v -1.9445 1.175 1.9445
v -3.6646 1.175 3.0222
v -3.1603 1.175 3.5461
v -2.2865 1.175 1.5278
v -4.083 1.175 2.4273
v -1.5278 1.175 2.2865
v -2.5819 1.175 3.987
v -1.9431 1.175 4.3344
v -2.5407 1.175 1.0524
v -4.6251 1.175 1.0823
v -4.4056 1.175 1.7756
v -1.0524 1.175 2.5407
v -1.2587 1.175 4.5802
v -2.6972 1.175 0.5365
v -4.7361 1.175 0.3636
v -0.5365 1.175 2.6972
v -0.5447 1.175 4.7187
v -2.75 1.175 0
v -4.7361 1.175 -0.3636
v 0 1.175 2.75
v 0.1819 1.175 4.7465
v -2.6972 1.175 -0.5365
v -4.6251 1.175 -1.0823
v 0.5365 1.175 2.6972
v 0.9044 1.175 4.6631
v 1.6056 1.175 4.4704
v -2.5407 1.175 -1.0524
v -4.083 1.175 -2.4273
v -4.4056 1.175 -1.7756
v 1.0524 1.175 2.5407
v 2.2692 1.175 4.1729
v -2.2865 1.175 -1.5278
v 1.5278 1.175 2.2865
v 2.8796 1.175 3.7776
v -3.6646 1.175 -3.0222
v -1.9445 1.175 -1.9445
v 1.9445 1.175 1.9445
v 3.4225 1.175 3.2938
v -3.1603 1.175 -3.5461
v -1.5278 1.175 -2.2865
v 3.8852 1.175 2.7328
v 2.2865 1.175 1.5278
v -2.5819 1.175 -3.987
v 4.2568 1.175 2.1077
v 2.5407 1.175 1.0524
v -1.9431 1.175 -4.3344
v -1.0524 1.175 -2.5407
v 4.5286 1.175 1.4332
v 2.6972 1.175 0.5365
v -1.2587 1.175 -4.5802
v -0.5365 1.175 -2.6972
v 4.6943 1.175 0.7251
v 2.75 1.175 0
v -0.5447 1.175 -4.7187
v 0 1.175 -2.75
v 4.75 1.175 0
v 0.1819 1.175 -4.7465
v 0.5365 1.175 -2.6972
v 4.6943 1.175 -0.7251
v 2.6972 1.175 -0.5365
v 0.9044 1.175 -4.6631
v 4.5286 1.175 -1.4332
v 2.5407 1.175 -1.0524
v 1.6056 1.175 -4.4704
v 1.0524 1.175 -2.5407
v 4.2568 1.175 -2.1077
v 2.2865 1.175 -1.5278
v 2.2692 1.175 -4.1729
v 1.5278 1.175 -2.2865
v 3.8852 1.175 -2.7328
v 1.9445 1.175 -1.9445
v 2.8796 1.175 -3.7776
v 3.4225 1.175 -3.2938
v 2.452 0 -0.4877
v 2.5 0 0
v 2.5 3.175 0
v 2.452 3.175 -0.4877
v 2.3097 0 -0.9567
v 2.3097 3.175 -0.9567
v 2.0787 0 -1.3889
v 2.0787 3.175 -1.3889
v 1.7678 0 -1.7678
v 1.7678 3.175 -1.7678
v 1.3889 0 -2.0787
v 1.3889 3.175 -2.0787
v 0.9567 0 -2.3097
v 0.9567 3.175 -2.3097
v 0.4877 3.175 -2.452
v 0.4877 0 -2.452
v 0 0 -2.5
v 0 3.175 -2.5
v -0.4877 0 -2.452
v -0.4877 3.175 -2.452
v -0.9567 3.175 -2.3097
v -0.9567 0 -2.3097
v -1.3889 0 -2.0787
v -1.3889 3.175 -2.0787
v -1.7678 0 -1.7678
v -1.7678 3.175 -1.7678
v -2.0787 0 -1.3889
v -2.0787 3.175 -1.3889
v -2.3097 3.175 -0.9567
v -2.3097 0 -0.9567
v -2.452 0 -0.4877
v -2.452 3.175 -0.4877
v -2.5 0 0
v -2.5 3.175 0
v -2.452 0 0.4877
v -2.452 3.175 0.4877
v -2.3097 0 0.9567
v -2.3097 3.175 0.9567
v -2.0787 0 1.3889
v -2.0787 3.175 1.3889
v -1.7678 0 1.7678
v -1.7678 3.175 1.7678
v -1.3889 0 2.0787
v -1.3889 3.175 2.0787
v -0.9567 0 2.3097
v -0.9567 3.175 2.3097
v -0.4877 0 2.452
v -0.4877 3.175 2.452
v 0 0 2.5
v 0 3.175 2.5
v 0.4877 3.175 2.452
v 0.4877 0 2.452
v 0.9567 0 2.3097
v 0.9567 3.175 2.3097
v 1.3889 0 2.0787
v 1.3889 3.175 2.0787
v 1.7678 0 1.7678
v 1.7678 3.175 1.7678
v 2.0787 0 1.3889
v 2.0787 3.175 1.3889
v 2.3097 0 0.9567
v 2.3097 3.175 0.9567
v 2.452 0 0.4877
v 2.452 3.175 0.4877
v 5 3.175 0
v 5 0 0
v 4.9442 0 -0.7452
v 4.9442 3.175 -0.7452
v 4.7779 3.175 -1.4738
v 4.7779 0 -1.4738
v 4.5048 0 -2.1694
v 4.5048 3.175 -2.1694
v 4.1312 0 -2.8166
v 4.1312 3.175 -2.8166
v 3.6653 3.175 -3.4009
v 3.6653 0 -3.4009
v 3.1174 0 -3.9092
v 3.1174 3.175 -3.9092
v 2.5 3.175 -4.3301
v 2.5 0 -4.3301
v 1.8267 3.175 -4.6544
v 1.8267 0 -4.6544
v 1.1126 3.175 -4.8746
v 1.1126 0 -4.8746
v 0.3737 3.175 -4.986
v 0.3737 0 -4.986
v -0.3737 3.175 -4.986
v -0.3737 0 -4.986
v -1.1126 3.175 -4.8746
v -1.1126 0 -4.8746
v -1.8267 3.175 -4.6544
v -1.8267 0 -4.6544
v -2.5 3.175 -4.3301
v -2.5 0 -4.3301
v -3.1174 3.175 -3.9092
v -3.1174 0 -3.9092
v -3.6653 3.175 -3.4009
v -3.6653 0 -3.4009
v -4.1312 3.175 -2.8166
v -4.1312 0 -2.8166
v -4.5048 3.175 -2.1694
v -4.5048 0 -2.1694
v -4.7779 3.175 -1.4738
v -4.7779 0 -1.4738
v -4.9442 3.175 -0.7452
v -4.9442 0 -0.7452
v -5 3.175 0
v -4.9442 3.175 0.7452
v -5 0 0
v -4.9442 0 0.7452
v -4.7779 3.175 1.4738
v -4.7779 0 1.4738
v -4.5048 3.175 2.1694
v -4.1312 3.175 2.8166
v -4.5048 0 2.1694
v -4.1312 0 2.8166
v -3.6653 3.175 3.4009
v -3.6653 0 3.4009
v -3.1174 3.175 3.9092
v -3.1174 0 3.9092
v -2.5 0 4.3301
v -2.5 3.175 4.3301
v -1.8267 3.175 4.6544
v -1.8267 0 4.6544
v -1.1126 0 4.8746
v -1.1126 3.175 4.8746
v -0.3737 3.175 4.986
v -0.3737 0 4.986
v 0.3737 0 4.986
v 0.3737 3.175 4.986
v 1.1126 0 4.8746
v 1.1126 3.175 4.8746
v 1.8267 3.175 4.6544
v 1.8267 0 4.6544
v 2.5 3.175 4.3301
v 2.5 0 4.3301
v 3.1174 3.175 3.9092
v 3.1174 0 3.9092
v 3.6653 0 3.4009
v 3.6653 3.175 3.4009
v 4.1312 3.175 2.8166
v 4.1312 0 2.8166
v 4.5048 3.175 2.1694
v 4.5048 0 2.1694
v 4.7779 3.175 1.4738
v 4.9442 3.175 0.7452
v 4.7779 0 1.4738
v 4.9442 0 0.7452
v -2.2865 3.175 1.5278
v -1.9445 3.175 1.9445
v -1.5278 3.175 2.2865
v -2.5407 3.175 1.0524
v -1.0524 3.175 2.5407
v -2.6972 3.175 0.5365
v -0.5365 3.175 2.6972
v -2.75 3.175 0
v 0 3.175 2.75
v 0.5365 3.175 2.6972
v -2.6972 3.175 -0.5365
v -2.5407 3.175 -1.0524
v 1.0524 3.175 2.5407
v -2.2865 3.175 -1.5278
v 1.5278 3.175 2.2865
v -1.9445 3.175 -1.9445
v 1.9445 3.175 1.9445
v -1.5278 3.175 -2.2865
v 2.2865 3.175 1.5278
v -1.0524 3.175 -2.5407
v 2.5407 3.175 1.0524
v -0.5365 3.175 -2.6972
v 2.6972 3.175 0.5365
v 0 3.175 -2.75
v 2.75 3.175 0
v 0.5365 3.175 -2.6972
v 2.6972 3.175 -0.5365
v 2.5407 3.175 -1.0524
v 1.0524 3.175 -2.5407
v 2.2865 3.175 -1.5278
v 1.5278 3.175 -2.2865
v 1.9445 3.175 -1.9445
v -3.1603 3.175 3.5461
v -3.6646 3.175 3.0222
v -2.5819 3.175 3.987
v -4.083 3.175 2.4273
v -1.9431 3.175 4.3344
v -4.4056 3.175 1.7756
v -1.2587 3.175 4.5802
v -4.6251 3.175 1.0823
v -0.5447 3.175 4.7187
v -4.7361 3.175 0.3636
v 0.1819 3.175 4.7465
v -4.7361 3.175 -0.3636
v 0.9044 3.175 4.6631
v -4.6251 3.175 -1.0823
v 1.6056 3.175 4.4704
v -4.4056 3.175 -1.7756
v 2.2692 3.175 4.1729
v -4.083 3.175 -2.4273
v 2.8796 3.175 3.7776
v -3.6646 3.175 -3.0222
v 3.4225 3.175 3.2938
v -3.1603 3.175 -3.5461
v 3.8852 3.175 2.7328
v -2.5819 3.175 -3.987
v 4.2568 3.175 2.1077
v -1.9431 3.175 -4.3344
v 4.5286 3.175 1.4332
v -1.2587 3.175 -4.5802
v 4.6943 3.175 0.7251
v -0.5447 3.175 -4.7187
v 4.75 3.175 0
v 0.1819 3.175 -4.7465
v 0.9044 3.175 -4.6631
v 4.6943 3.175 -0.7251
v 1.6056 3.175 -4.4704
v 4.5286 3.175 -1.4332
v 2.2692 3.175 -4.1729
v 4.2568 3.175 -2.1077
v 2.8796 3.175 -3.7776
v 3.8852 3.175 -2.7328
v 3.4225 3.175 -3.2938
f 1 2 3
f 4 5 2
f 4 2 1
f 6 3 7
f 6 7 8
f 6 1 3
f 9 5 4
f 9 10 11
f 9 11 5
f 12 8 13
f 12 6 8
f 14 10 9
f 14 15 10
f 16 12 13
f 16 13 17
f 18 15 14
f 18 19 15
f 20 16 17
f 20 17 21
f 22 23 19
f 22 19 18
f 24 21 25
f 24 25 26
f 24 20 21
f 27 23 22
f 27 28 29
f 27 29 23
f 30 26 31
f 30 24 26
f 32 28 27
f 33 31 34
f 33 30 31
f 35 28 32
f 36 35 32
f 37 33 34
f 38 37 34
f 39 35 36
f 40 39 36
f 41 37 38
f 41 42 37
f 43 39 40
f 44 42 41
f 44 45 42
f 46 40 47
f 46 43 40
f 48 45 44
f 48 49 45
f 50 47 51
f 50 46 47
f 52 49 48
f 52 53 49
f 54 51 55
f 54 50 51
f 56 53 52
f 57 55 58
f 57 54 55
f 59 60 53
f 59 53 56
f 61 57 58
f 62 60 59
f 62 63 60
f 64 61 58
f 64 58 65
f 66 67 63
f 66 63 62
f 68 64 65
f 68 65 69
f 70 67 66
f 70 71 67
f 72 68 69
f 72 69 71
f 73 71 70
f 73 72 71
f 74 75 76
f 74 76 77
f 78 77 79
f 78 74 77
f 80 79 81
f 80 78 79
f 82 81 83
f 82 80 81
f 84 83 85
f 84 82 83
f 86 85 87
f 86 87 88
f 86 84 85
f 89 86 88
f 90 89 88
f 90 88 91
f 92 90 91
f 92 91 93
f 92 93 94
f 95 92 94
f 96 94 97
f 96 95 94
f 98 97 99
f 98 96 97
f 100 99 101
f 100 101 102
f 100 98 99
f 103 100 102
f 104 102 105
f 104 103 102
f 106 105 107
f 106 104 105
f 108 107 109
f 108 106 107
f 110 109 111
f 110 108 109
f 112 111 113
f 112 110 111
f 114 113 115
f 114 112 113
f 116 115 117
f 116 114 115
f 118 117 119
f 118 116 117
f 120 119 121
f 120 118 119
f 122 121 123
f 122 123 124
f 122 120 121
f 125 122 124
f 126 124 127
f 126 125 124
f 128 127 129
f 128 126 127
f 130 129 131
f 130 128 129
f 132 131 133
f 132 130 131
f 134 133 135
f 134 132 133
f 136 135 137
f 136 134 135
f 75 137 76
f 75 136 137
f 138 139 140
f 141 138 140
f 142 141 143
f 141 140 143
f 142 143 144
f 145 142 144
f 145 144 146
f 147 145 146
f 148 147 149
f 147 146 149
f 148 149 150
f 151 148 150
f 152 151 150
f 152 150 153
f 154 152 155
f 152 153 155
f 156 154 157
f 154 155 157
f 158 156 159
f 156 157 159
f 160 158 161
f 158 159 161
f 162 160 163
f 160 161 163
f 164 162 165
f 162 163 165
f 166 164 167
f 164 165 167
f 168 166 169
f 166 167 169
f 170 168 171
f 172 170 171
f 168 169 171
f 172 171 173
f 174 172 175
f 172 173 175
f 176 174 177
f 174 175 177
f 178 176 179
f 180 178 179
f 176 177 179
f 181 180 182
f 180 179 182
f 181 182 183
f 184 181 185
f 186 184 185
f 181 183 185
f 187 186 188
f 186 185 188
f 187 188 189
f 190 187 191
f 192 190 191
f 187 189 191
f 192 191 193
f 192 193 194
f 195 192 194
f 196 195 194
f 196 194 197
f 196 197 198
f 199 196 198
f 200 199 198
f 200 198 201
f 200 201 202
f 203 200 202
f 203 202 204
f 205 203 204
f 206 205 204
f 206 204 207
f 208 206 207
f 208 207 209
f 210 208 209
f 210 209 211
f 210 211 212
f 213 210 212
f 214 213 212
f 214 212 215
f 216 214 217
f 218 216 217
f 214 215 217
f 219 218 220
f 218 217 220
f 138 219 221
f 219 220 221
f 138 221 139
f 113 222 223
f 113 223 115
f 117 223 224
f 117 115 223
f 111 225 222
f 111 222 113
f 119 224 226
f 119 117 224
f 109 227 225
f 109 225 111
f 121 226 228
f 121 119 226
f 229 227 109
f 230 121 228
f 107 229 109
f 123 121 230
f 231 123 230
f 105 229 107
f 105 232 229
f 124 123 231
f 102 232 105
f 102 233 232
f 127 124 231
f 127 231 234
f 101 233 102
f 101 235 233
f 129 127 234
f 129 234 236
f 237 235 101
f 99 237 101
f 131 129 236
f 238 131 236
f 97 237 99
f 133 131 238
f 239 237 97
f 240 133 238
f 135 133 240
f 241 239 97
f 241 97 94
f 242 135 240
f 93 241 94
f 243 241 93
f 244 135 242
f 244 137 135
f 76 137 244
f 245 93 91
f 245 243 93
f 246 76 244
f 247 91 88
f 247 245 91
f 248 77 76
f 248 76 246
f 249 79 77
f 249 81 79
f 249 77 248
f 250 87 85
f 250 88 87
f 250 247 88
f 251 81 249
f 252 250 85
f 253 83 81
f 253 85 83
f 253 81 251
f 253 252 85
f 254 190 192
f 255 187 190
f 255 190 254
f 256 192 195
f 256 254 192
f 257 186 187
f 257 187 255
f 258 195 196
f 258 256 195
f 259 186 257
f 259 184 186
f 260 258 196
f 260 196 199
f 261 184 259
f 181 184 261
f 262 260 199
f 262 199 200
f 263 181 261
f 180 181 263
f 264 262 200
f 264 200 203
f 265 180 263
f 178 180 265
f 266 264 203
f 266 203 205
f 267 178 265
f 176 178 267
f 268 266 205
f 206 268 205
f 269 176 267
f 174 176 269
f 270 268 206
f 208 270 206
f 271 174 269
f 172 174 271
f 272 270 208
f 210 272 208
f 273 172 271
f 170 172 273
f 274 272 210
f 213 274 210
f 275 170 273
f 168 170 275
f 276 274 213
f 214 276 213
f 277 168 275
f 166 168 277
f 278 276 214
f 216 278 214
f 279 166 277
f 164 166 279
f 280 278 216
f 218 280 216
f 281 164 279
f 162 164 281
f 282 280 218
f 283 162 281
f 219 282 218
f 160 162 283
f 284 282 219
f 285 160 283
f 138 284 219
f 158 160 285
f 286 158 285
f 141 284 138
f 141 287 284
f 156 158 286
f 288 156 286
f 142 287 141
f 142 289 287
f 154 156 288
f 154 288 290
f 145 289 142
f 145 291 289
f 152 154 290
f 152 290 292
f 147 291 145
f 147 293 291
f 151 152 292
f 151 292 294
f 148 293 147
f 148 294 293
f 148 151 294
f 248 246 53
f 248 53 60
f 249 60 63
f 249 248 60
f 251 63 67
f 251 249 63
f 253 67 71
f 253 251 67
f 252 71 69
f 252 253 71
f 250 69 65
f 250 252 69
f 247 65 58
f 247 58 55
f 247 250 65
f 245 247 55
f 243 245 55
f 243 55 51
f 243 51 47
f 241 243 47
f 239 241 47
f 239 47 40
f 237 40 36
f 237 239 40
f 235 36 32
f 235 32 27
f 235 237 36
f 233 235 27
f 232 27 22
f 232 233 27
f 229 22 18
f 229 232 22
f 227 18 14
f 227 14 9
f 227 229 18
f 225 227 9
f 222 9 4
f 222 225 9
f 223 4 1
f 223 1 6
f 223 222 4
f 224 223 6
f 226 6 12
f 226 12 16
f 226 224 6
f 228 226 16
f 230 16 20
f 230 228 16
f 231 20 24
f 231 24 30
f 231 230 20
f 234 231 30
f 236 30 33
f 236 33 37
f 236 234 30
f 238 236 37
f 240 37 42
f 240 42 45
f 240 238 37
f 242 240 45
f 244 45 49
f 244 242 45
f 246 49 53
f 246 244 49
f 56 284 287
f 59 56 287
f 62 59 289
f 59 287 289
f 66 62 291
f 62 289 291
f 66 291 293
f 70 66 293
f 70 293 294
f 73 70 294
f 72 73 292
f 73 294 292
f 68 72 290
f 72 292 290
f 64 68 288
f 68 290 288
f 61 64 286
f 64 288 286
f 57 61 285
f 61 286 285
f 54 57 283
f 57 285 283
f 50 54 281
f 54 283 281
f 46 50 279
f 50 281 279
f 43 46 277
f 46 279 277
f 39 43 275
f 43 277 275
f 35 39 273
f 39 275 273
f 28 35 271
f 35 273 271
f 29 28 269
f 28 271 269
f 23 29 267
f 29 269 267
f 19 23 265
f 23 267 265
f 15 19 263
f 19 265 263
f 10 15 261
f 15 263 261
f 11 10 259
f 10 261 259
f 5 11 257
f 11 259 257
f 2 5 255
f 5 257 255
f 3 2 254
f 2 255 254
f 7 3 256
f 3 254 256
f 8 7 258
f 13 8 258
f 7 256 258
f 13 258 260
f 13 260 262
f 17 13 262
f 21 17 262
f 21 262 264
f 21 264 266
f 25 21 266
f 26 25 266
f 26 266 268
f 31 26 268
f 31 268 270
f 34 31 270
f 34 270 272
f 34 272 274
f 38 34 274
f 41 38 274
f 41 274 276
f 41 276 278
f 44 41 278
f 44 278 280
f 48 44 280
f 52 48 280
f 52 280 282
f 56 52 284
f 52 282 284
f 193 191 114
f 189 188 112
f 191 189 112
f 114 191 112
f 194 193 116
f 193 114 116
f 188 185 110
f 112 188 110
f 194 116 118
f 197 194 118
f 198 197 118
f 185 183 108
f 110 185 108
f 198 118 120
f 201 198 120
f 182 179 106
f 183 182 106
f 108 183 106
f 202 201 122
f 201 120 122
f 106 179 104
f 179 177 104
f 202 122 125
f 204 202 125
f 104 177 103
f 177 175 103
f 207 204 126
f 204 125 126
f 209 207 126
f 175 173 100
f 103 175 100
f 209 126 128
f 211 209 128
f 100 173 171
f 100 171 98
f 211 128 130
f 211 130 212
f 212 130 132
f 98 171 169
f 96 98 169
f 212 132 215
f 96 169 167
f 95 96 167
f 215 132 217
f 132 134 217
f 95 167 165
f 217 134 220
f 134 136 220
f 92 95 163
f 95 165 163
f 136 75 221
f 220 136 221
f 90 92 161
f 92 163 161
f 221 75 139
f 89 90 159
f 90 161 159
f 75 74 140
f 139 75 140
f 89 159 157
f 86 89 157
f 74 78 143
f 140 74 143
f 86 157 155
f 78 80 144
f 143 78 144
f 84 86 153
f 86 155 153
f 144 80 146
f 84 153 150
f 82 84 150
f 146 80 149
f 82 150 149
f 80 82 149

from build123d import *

# Parameters (mm, degrees)
SKETCH1_R           = 5
SKETCH1_R_2         = 2.5
BOSS_EXTRUDE1_DEPTH = 3.175
SKETCH2_R           = 4.75
SKETCH2_R_2         = 2.75
CUT_EXTRUDE1_DEPTH  = 2


with BuildPart() as part:
    # Sketch1 → Boss-Extrude1 (new body)
    with BuildSketch(Plane(origin=(0, 0, 0), x_dir=(1, 0, 0), z_dir=(0, 1, 0))):
        Circle(SKETCH1_R)
        Circle(SKETCH1_R_2, mode=Mode.SUBTRACT)
    extrude(amount=BOSS_EXTRUDE1_DEPTH)

    # Sketch2 → Cut-Extrude1 (cut)
    with BuildSketch(Plane(origin=(0, 3.175, 0), x_dir=(1, 0, 0), z_dir=(0, 1, 0))):
        Circle(SKETCH2_R)
        Circle(SKETCH2_R_2, mode=Mode.SUBTRACT)
    extrude(amount=-CUT_EXTRUDE1_DEPTH, mode=Mode.SUBTRACT)


solid = part.part
